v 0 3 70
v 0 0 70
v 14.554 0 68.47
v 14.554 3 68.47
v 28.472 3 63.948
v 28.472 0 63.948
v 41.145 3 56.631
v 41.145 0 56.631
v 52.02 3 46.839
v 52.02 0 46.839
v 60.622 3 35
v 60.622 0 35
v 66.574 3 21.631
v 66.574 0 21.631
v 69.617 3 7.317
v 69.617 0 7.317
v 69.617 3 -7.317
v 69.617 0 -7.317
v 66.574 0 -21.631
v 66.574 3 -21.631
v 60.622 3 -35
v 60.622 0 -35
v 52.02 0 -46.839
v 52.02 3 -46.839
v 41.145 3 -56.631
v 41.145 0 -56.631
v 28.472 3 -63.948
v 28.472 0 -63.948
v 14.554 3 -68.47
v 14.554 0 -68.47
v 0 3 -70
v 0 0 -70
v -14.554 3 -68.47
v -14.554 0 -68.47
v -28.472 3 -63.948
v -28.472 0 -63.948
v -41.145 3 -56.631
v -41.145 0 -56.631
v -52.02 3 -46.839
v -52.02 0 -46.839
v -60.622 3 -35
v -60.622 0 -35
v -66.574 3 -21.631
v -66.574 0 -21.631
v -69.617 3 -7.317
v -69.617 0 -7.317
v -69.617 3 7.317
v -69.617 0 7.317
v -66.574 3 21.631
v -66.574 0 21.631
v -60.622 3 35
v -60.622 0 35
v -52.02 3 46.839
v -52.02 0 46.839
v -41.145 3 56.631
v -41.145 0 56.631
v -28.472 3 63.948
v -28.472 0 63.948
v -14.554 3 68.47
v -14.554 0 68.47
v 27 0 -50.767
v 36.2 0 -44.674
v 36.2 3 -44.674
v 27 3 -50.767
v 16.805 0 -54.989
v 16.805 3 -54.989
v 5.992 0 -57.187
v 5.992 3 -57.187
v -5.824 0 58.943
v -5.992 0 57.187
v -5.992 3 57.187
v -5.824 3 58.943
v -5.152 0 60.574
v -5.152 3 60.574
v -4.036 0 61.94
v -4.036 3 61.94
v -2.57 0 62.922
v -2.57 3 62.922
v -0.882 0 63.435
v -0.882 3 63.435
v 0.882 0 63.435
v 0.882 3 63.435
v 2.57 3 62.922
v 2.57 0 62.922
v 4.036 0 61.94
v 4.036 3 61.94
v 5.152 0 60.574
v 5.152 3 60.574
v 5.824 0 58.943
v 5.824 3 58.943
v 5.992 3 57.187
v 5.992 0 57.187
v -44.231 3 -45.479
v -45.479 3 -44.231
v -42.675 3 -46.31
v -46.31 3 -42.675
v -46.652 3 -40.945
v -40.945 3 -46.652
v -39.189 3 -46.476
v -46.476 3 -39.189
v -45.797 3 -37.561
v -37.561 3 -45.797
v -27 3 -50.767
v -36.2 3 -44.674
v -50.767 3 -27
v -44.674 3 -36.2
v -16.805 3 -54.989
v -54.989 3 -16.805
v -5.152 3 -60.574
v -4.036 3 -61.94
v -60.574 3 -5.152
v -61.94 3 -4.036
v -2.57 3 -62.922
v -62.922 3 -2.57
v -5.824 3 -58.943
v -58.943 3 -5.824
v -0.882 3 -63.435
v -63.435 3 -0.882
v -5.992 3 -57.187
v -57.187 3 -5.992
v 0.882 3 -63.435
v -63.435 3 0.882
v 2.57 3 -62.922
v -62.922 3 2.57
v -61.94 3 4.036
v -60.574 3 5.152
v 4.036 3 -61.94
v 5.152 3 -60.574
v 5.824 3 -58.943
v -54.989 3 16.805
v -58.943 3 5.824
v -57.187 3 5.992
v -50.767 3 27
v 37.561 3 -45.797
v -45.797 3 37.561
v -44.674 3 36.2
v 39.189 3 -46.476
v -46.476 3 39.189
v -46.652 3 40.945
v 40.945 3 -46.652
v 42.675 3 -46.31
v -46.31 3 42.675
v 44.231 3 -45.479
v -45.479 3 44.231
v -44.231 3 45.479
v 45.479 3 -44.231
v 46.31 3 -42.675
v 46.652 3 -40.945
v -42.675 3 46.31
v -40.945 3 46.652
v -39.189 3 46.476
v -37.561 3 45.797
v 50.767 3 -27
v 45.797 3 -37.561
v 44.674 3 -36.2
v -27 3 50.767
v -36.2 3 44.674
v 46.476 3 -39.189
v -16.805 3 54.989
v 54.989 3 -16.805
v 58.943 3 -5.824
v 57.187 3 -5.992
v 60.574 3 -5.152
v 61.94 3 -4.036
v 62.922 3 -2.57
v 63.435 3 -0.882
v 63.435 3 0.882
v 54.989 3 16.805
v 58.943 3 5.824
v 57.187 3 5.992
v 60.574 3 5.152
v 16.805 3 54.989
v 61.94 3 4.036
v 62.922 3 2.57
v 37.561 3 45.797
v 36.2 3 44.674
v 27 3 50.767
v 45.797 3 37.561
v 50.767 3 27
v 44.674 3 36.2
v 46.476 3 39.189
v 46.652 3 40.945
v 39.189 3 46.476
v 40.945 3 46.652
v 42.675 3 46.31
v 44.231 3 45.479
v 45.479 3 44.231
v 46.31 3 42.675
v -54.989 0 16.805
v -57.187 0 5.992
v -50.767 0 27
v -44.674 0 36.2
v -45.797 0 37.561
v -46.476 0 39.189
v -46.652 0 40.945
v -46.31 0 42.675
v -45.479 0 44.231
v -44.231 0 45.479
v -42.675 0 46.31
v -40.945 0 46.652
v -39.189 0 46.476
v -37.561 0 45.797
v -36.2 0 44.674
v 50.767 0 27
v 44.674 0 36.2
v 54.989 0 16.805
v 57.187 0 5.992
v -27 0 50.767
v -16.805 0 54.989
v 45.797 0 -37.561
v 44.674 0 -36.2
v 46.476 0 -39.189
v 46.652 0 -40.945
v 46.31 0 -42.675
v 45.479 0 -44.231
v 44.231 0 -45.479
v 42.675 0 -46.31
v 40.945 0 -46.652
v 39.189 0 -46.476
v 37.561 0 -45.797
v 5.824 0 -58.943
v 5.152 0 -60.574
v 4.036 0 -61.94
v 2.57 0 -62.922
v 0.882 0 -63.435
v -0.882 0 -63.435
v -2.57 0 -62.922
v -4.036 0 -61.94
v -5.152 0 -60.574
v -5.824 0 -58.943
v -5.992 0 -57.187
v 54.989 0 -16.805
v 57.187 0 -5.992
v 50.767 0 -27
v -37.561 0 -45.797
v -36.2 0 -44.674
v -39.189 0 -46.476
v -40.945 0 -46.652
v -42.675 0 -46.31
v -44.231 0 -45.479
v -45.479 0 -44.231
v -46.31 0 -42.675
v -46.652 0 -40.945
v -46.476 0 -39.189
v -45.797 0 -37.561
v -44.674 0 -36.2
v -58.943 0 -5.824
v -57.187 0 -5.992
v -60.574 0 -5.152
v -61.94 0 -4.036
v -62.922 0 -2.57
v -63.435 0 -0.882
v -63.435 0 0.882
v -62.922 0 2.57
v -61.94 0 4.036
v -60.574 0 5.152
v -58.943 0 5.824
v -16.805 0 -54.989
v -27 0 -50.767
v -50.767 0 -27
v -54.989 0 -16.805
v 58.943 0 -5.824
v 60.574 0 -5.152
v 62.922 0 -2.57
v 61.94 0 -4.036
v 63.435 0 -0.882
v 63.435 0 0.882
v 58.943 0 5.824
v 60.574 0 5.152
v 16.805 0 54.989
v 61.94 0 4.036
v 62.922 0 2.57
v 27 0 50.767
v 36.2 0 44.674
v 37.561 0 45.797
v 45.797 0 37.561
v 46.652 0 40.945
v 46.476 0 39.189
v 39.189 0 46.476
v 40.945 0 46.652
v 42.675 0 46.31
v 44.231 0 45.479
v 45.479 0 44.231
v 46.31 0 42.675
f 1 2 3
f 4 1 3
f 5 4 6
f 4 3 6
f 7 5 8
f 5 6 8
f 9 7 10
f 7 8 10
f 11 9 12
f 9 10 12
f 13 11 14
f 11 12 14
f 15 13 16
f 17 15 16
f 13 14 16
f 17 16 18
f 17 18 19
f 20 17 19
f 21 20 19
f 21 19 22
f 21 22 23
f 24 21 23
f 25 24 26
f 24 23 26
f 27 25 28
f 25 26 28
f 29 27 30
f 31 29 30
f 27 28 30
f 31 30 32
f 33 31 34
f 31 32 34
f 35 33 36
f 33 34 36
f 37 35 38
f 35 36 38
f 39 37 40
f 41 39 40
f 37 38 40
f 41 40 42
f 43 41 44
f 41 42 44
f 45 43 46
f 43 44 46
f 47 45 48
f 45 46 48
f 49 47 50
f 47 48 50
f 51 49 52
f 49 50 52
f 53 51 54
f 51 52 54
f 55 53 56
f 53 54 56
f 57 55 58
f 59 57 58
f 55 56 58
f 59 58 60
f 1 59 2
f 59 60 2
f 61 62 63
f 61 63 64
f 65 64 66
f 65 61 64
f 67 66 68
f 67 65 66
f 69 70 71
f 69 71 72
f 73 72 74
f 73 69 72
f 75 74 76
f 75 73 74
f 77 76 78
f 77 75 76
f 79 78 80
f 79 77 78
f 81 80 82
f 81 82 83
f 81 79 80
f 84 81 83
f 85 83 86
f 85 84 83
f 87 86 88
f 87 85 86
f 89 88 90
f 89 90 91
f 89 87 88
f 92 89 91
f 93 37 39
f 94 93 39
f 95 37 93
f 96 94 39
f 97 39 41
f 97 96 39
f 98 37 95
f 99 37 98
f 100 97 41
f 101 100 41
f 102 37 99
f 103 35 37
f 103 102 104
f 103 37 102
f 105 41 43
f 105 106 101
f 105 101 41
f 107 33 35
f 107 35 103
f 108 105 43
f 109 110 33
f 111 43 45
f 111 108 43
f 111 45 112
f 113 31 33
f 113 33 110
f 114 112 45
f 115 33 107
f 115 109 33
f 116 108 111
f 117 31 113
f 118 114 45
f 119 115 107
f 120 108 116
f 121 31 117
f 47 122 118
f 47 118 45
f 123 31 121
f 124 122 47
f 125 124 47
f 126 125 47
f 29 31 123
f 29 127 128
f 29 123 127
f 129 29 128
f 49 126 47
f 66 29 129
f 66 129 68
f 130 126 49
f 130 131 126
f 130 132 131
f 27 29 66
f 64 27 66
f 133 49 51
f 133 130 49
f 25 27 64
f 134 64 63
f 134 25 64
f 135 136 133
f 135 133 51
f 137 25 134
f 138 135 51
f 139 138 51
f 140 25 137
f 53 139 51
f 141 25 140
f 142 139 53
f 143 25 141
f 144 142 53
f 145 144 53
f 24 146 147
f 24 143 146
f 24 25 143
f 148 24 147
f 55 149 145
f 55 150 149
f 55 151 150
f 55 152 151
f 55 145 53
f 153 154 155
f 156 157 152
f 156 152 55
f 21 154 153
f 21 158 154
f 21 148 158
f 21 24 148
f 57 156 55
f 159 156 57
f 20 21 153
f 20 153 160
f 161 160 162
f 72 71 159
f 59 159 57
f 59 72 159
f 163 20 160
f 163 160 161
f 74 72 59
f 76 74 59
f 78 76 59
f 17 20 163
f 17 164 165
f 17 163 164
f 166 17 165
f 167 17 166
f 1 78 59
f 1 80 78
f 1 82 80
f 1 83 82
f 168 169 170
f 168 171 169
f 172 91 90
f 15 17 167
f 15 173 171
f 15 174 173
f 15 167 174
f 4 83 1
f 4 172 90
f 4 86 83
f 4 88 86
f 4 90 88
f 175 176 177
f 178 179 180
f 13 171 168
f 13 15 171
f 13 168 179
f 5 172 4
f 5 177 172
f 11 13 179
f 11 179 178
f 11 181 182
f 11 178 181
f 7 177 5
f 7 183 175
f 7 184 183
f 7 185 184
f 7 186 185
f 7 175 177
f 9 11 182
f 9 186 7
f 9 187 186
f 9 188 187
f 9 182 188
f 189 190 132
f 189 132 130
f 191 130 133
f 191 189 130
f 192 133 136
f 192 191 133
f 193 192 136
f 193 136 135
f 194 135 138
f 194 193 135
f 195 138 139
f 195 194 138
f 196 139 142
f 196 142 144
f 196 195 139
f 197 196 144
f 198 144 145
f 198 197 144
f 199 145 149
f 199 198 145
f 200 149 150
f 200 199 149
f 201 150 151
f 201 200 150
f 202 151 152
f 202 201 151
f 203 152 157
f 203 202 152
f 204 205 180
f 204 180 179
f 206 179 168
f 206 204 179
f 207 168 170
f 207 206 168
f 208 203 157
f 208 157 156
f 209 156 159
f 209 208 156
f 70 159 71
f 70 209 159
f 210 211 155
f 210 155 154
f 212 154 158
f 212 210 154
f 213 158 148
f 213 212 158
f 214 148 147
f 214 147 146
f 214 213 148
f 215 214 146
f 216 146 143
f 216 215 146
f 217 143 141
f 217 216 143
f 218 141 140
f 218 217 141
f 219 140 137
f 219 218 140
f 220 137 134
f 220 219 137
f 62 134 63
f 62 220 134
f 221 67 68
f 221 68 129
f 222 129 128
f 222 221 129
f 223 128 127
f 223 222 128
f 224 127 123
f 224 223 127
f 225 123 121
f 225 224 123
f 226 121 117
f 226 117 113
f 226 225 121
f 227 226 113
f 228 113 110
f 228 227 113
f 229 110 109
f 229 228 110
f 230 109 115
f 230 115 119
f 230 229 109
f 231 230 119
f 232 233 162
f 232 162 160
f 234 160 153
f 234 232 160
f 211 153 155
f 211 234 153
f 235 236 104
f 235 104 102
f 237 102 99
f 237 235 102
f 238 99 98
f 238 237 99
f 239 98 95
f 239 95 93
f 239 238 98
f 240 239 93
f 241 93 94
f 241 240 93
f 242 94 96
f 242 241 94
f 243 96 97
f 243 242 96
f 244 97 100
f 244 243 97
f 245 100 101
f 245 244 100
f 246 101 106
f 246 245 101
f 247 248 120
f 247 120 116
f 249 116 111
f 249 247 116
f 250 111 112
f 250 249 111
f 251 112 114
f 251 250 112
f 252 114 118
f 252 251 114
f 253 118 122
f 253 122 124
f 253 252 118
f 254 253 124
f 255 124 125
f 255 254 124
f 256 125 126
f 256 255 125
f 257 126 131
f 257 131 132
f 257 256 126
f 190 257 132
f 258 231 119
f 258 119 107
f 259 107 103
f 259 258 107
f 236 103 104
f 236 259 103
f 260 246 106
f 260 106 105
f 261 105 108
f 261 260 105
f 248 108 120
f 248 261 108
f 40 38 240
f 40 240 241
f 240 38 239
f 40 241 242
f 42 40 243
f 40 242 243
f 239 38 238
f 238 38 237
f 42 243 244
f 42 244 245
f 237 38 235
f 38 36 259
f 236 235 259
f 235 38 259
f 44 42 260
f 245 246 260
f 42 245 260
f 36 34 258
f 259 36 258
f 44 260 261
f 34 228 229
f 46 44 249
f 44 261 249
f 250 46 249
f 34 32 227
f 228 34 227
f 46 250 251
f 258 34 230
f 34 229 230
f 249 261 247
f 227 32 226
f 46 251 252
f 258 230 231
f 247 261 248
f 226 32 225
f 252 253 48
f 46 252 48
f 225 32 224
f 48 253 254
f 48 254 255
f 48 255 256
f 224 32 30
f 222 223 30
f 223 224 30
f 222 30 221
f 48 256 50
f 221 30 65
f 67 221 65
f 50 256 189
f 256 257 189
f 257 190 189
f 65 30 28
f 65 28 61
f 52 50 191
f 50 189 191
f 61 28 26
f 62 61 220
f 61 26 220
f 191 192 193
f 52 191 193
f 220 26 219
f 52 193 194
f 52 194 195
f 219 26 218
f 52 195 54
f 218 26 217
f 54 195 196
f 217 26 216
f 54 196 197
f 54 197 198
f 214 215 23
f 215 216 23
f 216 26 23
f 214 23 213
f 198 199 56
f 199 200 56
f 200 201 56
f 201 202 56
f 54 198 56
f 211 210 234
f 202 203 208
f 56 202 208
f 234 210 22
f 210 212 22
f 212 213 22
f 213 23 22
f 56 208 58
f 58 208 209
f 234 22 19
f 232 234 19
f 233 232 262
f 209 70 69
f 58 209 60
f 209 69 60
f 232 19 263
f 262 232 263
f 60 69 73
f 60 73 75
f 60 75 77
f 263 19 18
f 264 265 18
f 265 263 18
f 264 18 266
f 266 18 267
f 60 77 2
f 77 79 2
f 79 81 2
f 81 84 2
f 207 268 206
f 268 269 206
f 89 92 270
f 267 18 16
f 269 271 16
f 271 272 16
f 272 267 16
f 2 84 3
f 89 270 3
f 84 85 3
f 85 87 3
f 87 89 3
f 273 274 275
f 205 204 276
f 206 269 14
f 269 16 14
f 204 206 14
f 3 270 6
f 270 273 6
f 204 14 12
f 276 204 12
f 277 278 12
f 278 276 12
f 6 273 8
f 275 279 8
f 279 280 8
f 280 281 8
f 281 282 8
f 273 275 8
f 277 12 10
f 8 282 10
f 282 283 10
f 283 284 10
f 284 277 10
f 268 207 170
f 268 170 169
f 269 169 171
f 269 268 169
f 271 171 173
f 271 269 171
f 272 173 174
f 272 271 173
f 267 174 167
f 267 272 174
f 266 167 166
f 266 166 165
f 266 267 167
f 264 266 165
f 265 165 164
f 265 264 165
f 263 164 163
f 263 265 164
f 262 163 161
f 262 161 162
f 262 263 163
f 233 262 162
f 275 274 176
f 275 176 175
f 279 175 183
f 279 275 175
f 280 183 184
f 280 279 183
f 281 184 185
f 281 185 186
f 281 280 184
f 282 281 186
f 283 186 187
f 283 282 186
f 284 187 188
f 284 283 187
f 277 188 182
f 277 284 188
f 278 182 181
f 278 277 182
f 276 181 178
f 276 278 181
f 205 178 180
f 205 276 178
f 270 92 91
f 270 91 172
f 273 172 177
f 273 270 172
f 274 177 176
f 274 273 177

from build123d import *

# Parameters (mm, degrees)
SKETCH_1_R      = 70
EXTRUDE_1_DEPTH = 3


with BuildPart() as part:
    # Эскиз1 → Бобышка-Вытянуть1 (new body)
    with BuildSketch(Plane(origin=(0, 0, 0), x_dir=(1, 0, 0), z_dir=(0, 1, 0))):
        with Locations(Location((0, 0, 0), (0, 0, 270))):
            Circle(SKETCH_1_R)
        with BuildLine():
            ThreePointArc((-5.991828083, 57.186956522), (-22.004297361, 53.123073119), (-36.200422482, 44.674147021))
            ThreePointArc((-36.200422482, 44.674147021), (-44.901280605, 44.901280605), (-44.674147021, 36.200422482))
            ThreePointArc((-44.674147021, 36.200422482), (-53.123073119, 22.004297361), (-57.186956522, 5.991828083))
            ThreePointArc((-57.186956522, 5.991828083), (-63.5, 0), (-57.186956522, -5.991828083))
            ThreePointArc((-57.186956522, -5.991828083), (-53.123073119, -22.004297361), (-44.674147021, -36.200422482))
            ThreePointArc((-44.674147021, -36.200422482), (-44.901280605, -44.901280605), (-36.200422482, -44.674147021))
            ThreePointArc((-36.200422482, -44.674147021), (-22.004297361, -53.123073119), (-5.991828083, -57.186956522))
            ThreePointArc((-5.991828083, -57.186956522), (0, -63.5), (5.991828083, -57.186956522))
            ThreePointArc((5.991828083, -57.186956522), (22.004297361, -53.123073119), (36.200422482, -44.674147021))
            ThreePointArc((36.200422482, -44.674147021), (44.901280605, -44.901280605), (44.674147021, -36.200422482))
            ThreePointArc((44.674147021, -36.200422482), (53.123073119, -22.004297361), (57.186956522, -5.991828083))
            ThreePointArc((57.186956522, -5.991828083), (63.5, 0), (57.186956522, 5.991828083))
            ThreePointArc((57.186956522, 5.991828083), (53.123073119, 22.004297361), (44.674147021, 36.200422482))
            ThreePointArc((44.674147021, 36.200422482), (44.901280605, 44.901280605), (36.200422482, 44.674147021))
            ThreePointArc((36.200422482, 44.674147021), (22.004297361, 53.123073119), (5.991828083, 57.186956522))
            ThreePointArc((5.991828083, 57.186956522), (0, 63.5), (-5.991828083, 57.186956522))
        make_face(mode=Mode.SUBTRACT)
    extrude(amount=EXTRUDE_1_DEPTH)


solid = part.part
